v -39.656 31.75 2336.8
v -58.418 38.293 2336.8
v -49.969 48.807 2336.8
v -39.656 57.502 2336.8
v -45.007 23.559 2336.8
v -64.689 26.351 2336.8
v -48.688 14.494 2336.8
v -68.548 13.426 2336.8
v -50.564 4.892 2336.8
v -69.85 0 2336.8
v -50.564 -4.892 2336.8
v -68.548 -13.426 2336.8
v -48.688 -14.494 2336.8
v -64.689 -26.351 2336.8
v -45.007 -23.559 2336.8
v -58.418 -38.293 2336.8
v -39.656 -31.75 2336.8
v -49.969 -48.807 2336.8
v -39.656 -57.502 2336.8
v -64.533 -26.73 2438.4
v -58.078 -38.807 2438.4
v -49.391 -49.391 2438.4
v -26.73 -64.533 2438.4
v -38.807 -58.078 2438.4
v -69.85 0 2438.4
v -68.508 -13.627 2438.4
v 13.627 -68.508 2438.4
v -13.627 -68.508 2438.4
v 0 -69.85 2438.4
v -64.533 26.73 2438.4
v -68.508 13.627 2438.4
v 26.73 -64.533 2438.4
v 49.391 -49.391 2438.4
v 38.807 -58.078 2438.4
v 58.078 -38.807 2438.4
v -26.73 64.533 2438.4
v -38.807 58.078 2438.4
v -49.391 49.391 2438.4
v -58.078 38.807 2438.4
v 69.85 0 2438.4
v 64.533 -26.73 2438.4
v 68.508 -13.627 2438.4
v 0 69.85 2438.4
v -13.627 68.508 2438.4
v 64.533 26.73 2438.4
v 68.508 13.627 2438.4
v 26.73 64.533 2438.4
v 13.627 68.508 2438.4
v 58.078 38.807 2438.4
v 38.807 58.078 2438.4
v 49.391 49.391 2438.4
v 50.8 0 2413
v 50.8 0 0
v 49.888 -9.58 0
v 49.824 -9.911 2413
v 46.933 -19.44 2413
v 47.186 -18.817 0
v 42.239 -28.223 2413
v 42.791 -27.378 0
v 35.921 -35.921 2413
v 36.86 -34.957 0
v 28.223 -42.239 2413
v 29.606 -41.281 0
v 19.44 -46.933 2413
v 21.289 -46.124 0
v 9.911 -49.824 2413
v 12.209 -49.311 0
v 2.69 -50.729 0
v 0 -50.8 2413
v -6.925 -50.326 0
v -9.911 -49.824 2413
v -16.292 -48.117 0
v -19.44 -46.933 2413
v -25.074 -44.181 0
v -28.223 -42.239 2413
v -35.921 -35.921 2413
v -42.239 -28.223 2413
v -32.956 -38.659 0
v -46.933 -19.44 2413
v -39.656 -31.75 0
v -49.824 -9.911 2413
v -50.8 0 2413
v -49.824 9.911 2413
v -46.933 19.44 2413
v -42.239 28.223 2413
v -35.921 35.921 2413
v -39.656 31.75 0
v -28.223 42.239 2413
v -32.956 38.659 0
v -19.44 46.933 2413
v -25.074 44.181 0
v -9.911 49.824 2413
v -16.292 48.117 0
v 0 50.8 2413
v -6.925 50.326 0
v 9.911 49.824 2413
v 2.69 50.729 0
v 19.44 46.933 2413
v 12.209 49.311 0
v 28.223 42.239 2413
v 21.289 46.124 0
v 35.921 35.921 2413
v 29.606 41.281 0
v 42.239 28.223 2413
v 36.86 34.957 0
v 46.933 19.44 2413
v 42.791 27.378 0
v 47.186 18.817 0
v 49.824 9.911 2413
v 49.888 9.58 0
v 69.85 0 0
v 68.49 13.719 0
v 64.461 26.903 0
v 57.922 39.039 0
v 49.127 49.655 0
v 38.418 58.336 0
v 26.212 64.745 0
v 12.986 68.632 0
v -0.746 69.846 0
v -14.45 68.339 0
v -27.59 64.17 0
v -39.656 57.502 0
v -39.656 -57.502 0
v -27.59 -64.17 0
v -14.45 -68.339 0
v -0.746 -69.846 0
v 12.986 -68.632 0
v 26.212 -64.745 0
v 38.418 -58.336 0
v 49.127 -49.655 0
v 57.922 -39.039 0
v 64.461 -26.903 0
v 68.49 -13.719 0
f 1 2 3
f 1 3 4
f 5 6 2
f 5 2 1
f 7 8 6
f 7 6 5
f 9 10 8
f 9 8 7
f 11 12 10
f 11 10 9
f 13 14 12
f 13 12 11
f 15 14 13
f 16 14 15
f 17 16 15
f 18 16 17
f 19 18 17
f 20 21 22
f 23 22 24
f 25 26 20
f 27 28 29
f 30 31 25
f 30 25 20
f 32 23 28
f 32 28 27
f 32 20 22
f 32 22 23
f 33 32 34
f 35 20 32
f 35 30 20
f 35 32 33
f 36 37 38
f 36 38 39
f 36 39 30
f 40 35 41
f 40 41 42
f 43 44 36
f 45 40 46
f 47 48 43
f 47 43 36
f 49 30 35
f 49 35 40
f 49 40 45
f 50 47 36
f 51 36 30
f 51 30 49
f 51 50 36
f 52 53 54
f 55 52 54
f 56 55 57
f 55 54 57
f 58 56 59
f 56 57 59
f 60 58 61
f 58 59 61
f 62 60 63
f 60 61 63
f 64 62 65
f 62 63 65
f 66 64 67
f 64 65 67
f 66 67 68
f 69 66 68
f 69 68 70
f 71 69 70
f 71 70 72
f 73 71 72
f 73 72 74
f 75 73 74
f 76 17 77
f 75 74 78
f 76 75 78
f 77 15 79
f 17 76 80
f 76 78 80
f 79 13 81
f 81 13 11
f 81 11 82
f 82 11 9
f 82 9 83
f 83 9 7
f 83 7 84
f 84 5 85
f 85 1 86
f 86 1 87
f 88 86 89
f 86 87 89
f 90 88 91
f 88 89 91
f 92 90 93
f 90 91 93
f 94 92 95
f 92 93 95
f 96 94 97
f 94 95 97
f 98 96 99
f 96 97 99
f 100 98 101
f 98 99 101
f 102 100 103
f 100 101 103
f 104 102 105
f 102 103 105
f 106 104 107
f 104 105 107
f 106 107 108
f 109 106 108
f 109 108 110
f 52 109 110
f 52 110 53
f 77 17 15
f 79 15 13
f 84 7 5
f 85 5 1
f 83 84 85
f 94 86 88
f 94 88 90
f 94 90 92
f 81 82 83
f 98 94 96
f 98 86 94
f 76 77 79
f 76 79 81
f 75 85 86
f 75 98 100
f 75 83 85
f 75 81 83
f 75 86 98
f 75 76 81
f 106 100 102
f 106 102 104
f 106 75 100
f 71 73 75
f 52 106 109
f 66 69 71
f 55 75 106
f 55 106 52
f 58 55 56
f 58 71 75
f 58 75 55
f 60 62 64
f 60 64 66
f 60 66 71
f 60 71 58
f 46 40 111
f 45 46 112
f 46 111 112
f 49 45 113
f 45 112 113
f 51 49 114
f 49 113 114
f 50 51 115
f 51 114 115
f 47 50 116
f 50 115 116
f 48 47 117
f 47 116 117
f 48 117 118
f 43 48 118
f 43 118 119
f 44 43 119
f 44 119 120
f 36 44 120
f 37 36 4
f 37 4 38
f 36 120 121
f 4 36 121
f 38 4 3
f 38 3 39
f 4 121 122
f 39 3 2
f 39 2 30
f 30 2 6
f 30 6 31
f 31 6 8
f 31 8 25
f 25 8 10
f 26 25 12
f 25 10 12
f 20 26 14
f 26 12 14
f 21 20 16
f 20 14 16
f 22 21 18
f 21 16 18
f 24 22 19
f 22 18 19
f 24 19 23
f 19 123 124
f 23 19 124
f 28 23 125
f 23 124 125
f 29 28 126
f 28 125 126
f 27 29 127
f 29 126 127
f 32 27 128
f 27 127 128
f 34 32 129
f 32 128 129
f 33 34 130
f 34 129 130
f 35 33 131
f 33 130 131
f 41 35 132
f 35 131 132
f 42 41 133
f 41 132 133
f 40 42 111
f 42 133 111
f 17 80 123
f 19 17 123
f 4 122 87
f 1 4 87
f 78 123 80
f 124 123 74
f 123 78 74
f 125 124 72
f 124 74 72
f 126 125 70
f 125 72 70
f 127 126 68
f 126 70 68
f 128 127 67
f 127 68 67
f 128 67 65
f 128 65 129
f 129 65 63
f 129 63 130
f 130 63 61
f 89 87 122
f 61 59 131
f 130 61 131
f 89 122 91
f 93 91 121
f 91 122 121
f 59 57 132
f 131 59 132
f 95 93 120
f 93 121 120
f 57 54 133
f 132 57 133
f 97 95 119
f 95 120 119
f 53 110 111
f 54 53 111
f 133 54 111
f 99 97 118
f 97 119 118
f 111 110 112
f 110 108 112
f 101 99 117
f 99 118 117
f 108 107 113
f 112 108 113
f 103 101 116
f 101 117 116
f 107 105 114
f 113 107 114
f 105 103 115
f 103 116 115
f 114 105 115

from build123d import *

# Parameters (mm, degrees)
F0_R     = 69.85
F1_DEPTH = 2438.4
F2_R     = 50.8
F3_DEPTH = 2413
F5_DEPTH = 2336.8


with BuildPart() as f1:
    # F0 (on Top) → F1 (new body)
    with BuildSketch(Plane.XY):
        Circle(F0_R)
    extrude(amount=F1_DEPTH)

    # F2 (on face) → F3 (cut)
    with BuildSketch(Plane(origin=(0, 0, 0), x_dir=(1, 0, 0), z_dir=(0, 0, -1))):
        Circle(F2_R)
    extrude(amount=-F3_DEPTH, mode=Mode.SUBTRACT)

    # F4 (on face) → F5 (cut)
    with BuildSketch(Plane(origin=(0, 0, 0), x_dir=(1, 0, 0), z_dir=(0, 0, -1))):
        with BuildLine():
            Line((-39.655737, 31.75), (-39.655737, 57.501696))
            ThreePointArc((-39.655737, 57.501696), (-69.85, 0), (-39.655737, -57.501696))
            Line((-39.655737, -57.501696), (-39.655737, -31.75))
            Line((-39.655737, -31.75), (-39.655737, 31.75))
        make_face()
    extrude(amount=-F5_DEPTH, mode=Mode.SUBTRACT)


solid = f1.part
